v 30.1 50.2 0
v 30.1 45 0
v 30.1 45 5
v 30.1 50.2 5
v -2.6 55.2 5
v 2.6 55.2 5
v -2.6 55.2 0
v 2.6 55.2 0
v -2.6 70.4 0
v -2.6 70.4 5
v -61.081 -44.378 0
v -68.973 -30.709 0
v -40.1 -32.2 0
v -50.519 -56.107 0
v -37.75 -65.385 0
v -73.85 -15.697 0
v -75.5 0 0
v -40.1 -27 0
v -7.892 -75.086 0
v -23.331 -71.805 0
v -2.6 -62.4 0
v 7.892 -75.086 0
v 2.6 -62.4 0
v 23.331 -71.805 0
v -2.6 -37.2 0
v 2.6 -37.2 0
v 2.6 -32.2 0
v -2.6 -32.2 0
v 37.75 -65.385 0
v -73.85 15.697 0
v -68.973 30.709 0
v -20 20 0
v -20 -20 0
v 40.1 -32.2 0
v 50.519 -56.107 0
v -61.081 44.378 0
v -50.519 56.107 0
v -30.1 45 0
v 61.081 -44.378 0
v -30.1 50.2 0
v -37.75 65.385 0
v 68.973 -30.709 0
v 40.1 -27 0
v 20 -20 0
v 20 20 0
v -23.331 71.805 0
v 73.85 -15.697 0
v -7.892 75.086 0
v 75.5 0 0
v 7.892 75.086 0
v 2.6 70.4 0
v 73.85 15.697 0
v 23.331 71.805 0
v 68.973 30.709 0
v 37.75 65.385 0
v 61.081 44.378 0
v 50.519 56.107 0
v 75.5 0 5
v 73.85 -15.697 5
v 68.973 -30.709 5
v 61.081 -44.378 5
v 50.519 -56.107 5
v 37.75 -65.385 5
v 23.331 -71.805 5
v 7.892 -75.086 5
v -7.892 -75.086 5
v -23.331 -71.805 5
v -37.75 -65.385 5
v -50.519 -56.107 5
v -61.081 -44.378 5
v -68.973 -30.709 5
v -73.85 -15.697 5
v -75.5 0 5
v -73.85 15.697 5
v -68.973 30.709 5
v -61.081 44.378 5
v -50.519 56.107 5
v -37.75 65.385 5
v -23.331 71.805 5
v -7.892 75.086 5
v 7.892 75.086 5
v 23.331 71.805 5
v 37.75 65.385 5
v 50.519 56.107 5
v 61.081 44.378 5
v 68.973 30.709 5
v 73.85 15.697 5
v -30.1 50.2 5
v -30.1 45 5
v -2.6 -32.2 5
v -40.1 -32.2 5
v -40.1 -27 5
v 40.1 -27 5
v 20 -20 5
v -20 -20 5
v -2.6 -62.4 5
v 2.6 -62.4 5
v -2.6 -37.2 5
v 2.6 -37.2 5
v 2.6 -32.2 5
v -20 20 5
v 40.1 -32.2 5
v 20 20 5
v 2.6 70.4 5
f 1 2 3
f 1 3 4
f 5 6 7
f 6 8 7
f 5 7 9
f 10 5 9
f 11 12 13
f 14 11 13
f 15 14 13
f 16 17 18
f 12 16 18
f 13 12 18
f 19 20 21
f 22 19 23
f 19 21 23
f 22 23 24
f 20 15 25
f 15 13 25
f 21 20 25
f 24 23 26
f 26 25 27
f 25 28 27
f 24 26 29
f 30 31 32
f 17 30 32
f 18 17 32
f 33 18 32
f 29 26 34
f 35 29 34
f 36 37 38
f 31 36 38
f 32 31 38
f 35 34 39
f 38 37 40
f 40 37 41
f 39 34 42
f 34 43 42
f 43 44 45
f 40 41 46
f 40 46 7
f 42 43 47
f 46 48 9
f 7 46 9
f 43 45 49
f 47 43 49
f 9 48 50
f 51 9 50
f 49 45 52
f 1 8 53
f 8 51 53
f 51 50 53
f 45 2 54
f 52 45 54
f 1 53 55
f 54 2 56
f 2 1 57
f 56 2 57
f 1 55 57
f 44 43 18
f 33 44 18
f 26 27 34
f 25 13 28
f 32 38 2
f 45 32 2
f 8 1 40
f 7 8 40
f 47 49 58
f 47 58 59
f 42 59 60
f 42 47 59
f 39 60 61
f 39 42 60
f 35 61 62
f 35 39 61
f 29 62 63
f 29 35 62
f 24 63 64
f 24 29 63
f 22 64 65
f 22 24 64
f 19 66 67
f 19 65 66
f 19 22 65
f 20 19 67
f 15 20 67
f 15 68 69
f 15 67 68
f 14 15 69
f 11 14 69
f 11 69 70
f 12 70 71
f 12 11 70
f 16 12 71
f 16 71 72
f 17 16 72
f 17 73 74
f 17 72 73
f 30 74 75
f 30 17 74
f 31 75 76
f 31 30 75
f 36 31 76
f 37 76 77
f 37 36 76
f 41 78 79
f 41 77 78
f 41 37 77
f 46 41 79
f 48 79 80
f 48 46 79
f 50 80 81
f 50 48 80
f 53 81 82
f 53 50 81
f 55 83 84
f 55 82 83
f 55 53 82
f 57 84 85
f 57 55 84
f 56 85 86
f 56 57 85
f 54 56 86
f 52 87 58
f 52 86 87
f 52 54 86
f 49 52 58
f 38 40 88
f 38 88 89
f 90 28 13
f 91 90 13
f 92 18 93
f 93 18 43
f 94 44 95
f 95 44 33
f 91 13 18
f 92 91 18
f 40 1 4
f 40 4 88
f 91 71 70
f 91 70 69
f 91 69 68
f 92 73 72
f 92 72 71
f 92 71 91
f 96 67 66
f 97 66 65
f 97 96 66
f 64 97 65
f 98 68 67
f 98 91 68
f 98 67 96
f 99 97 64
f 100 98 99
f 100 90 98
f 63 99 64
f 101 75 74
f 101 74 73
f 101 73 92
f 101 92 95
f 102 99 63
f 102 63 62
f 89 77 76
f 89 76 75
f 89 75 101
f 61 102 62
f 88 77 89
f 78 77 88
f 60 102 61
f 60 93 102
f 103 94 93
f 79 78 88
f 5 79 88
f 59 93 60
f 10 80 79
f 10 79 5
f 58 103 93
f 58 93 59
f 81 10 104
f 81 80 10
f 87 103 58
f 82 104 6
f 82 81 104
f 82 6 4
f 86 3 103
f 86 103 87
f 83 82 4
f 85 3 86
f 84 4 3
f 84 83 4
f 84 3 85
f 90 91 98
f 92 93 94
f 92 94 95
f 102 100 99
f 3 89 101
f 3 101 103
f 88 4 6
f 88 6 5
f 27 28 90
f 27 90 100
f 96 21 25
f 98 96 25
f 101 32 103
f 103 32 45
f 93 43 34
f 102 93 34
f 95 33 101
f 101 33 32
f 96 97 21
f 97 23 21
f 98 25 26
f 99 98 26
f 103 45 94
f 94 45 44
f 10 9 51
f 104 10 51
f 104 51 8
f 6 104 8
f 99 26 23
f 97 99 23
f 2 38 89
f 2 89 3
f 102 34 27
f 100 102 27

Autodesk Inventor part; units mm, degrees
ref_plane "YZ Plane" through (0, 0, 0) normal (1, 0, 0) x (0, 1, 0)
ref_plane "XZ Plane" through (0, 0, 0) normal (0, 1, 0) x (-1, 0, 0)
ref_plane "XY Plane" through (0, 0, 0) normal (0, 0, 1) x (1, 0, 0)
sketch "Skizze1" plane through (0, 0, 0) normal (0, 0, 1) x (1, 0, 0)
  circle A0 centre (0, 0) radius 80 construction
  circle A1 centre (0, 0) radius 76 construction
  circle A2 centre (0, 0) radius 75.5
  line L0 (-15, 25) -> (15, 25) construction
  line L1 (15, 25) -> (15, -25) construction
  line L2 (15, -25) -> (-15, -25) construction
  line L3 (-15, -25) -> (-15, 25) construction
  line L4 (-15, 25) -> (15, -25) construction
  line L5 (15, 25) -> (-15, -25) construction
  line L6 (-40.1, -27) -> (40.1, -27)
  line L7 (40.1, -27) -> (40.1, -32.2)
  line L8 (40.1, -32.2) -> (-40.1, -32.2)
  line L9 (-40.1, -32.2) -> (-40.1, -27)
  line L10 (-2.6, -32.2) -> (2.6, -32.2)
  line L11 (-30.1, 45) -> (30.1, 45)
  line L12 (30.1, 45) -> (30.1, 50.2)
  line L13 (30.1, 50.2) -> (-30.1, 50.2)
  line L14 (-30.1, 50.2) -> (-30.1, 45)
  line L15 (-2.6, -37.2) -> (2.6, -37.2)
  line L16 (2.6, -37.2) -> (2.6, -62.4)
  line L17 (2.6, -62.4) -> (-2.6, -62.4)
  line L18 (-2.6, -62.4) -> (-2.6, -37.2)
  line L19 (-20, 20) -> (20, 20)
  line L20 (20, 20) -> (20, -20)
  line L21 (20, -20) -> (-20, -20)
  line L22 (-20, -20) -> (-20, 20)
  line L23 (-20, 20) -> (20, -20) construction
  line L24 (20, 20) -> (-20, -20) construction
  line L25 (-2.6, 70.4) -> (2.6, 70.4)
  line L26 (2.6, 70.4) -> (2.6, 55.2)
  line L27 (2.6, 55.2) -> (-2.6, 55.2)
  line L28 (-2.6, 55.2) -> (-2.6, 70.4)
  point P0 (0, -32.2)
  point P1 (0, -32.2)
  point P2 (0, -32.2)
  point P3 (0, 45)
  point P4 (0, -37.2)
  dimension "d0" = 160
  dimension "d1" = 4
  dimension "d2" = 0.5
  dimension "d6" = 30
  dimension "d7" = 50
  dimension "d8" = 2
  dimension "d9" = 80.2
  dimension "d10" = 5.2
  dimension "d13" = 5.2
  dimension "d14" = 60.2
  dimension "d15" = 5.2
  dimension "d16" = 45
  dimension "d17" = 5.2
  dimension "d18" = 25.2
  dimension "d19" = 5
  dimension "d20" = 40
  dimension "d21" = 5
  dimension "d22" = 15.2
extrude "Extrusion1" add sketch "Skizze1" along normal blind 5
properties part number "Slider_1"
